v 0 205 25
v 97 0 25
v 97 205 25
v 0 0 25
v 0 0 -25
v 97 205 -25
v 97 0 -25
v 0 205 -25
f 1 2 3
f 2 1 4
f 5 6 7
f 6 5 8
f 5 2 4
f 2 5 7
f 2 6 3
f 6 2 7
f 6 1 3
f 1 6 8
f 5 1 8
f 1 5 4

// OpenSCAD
BoxTopLength=197;
BoxTopWidth=197;
BoxHeight=190;
LipHeight=4;
LipThickness=2;
LipOverHangWidth=25;
BoxTopThickness=2;
BoxThickness=2;
IsOpenTop=true;

/*
    NOTE: Med drawer is 404 mm wide.
*/
DrawerWidth = 403;

LgMedTray = false;
Md1MedTray = false;
Md2MedTray = false;
SmMedTray = false;
Custom = true;

//When true completes for the width of the drawer.
Complement = false;

/*
    Using just the cube to draw a box allows control of the
    top and wall thickness to be defined in the slicer.
    using 0% infill, # of walls and # of top layers will make it an tray.
*/
module Box(x,y,wall, height)
{
    b_floor = wall;
    //resize([0,0,0]) 
    translate([x/2,y/2,0]) 
    cube([x,y,height],true); //box floor    
}

module CubeNoTop(x,y,wall, height)
{
     translate([x/2,y/2,height/2]) 
     difference()
    {
        cube([x,y,height],true);
        cube([x-wall,y-wall,height+1], true);
    }
}

module drawTray()
{
    if(LgMedTray){if (!Complement) Box(76,225,2,35); else Box(76,DrawerWidth-225,2,35);}
    if(Md1MedTray){if (!Complement) Box(65,200,2,35); else Box(65,DrawerWidth-200,2,35);}
    if(Md2MedTray){if (!Complement) Box(47,196,2,35); else Box(47,DrawerWidth-196,2,35);}
    if(SmMedTray)
    {
        if (!Complement) Box(35,225,2,35); else Box(35,DrawerWidth-225,2,35);
    }
    if(Custom) {Box(97, 205, 2, 50); }
}

drawTray();
